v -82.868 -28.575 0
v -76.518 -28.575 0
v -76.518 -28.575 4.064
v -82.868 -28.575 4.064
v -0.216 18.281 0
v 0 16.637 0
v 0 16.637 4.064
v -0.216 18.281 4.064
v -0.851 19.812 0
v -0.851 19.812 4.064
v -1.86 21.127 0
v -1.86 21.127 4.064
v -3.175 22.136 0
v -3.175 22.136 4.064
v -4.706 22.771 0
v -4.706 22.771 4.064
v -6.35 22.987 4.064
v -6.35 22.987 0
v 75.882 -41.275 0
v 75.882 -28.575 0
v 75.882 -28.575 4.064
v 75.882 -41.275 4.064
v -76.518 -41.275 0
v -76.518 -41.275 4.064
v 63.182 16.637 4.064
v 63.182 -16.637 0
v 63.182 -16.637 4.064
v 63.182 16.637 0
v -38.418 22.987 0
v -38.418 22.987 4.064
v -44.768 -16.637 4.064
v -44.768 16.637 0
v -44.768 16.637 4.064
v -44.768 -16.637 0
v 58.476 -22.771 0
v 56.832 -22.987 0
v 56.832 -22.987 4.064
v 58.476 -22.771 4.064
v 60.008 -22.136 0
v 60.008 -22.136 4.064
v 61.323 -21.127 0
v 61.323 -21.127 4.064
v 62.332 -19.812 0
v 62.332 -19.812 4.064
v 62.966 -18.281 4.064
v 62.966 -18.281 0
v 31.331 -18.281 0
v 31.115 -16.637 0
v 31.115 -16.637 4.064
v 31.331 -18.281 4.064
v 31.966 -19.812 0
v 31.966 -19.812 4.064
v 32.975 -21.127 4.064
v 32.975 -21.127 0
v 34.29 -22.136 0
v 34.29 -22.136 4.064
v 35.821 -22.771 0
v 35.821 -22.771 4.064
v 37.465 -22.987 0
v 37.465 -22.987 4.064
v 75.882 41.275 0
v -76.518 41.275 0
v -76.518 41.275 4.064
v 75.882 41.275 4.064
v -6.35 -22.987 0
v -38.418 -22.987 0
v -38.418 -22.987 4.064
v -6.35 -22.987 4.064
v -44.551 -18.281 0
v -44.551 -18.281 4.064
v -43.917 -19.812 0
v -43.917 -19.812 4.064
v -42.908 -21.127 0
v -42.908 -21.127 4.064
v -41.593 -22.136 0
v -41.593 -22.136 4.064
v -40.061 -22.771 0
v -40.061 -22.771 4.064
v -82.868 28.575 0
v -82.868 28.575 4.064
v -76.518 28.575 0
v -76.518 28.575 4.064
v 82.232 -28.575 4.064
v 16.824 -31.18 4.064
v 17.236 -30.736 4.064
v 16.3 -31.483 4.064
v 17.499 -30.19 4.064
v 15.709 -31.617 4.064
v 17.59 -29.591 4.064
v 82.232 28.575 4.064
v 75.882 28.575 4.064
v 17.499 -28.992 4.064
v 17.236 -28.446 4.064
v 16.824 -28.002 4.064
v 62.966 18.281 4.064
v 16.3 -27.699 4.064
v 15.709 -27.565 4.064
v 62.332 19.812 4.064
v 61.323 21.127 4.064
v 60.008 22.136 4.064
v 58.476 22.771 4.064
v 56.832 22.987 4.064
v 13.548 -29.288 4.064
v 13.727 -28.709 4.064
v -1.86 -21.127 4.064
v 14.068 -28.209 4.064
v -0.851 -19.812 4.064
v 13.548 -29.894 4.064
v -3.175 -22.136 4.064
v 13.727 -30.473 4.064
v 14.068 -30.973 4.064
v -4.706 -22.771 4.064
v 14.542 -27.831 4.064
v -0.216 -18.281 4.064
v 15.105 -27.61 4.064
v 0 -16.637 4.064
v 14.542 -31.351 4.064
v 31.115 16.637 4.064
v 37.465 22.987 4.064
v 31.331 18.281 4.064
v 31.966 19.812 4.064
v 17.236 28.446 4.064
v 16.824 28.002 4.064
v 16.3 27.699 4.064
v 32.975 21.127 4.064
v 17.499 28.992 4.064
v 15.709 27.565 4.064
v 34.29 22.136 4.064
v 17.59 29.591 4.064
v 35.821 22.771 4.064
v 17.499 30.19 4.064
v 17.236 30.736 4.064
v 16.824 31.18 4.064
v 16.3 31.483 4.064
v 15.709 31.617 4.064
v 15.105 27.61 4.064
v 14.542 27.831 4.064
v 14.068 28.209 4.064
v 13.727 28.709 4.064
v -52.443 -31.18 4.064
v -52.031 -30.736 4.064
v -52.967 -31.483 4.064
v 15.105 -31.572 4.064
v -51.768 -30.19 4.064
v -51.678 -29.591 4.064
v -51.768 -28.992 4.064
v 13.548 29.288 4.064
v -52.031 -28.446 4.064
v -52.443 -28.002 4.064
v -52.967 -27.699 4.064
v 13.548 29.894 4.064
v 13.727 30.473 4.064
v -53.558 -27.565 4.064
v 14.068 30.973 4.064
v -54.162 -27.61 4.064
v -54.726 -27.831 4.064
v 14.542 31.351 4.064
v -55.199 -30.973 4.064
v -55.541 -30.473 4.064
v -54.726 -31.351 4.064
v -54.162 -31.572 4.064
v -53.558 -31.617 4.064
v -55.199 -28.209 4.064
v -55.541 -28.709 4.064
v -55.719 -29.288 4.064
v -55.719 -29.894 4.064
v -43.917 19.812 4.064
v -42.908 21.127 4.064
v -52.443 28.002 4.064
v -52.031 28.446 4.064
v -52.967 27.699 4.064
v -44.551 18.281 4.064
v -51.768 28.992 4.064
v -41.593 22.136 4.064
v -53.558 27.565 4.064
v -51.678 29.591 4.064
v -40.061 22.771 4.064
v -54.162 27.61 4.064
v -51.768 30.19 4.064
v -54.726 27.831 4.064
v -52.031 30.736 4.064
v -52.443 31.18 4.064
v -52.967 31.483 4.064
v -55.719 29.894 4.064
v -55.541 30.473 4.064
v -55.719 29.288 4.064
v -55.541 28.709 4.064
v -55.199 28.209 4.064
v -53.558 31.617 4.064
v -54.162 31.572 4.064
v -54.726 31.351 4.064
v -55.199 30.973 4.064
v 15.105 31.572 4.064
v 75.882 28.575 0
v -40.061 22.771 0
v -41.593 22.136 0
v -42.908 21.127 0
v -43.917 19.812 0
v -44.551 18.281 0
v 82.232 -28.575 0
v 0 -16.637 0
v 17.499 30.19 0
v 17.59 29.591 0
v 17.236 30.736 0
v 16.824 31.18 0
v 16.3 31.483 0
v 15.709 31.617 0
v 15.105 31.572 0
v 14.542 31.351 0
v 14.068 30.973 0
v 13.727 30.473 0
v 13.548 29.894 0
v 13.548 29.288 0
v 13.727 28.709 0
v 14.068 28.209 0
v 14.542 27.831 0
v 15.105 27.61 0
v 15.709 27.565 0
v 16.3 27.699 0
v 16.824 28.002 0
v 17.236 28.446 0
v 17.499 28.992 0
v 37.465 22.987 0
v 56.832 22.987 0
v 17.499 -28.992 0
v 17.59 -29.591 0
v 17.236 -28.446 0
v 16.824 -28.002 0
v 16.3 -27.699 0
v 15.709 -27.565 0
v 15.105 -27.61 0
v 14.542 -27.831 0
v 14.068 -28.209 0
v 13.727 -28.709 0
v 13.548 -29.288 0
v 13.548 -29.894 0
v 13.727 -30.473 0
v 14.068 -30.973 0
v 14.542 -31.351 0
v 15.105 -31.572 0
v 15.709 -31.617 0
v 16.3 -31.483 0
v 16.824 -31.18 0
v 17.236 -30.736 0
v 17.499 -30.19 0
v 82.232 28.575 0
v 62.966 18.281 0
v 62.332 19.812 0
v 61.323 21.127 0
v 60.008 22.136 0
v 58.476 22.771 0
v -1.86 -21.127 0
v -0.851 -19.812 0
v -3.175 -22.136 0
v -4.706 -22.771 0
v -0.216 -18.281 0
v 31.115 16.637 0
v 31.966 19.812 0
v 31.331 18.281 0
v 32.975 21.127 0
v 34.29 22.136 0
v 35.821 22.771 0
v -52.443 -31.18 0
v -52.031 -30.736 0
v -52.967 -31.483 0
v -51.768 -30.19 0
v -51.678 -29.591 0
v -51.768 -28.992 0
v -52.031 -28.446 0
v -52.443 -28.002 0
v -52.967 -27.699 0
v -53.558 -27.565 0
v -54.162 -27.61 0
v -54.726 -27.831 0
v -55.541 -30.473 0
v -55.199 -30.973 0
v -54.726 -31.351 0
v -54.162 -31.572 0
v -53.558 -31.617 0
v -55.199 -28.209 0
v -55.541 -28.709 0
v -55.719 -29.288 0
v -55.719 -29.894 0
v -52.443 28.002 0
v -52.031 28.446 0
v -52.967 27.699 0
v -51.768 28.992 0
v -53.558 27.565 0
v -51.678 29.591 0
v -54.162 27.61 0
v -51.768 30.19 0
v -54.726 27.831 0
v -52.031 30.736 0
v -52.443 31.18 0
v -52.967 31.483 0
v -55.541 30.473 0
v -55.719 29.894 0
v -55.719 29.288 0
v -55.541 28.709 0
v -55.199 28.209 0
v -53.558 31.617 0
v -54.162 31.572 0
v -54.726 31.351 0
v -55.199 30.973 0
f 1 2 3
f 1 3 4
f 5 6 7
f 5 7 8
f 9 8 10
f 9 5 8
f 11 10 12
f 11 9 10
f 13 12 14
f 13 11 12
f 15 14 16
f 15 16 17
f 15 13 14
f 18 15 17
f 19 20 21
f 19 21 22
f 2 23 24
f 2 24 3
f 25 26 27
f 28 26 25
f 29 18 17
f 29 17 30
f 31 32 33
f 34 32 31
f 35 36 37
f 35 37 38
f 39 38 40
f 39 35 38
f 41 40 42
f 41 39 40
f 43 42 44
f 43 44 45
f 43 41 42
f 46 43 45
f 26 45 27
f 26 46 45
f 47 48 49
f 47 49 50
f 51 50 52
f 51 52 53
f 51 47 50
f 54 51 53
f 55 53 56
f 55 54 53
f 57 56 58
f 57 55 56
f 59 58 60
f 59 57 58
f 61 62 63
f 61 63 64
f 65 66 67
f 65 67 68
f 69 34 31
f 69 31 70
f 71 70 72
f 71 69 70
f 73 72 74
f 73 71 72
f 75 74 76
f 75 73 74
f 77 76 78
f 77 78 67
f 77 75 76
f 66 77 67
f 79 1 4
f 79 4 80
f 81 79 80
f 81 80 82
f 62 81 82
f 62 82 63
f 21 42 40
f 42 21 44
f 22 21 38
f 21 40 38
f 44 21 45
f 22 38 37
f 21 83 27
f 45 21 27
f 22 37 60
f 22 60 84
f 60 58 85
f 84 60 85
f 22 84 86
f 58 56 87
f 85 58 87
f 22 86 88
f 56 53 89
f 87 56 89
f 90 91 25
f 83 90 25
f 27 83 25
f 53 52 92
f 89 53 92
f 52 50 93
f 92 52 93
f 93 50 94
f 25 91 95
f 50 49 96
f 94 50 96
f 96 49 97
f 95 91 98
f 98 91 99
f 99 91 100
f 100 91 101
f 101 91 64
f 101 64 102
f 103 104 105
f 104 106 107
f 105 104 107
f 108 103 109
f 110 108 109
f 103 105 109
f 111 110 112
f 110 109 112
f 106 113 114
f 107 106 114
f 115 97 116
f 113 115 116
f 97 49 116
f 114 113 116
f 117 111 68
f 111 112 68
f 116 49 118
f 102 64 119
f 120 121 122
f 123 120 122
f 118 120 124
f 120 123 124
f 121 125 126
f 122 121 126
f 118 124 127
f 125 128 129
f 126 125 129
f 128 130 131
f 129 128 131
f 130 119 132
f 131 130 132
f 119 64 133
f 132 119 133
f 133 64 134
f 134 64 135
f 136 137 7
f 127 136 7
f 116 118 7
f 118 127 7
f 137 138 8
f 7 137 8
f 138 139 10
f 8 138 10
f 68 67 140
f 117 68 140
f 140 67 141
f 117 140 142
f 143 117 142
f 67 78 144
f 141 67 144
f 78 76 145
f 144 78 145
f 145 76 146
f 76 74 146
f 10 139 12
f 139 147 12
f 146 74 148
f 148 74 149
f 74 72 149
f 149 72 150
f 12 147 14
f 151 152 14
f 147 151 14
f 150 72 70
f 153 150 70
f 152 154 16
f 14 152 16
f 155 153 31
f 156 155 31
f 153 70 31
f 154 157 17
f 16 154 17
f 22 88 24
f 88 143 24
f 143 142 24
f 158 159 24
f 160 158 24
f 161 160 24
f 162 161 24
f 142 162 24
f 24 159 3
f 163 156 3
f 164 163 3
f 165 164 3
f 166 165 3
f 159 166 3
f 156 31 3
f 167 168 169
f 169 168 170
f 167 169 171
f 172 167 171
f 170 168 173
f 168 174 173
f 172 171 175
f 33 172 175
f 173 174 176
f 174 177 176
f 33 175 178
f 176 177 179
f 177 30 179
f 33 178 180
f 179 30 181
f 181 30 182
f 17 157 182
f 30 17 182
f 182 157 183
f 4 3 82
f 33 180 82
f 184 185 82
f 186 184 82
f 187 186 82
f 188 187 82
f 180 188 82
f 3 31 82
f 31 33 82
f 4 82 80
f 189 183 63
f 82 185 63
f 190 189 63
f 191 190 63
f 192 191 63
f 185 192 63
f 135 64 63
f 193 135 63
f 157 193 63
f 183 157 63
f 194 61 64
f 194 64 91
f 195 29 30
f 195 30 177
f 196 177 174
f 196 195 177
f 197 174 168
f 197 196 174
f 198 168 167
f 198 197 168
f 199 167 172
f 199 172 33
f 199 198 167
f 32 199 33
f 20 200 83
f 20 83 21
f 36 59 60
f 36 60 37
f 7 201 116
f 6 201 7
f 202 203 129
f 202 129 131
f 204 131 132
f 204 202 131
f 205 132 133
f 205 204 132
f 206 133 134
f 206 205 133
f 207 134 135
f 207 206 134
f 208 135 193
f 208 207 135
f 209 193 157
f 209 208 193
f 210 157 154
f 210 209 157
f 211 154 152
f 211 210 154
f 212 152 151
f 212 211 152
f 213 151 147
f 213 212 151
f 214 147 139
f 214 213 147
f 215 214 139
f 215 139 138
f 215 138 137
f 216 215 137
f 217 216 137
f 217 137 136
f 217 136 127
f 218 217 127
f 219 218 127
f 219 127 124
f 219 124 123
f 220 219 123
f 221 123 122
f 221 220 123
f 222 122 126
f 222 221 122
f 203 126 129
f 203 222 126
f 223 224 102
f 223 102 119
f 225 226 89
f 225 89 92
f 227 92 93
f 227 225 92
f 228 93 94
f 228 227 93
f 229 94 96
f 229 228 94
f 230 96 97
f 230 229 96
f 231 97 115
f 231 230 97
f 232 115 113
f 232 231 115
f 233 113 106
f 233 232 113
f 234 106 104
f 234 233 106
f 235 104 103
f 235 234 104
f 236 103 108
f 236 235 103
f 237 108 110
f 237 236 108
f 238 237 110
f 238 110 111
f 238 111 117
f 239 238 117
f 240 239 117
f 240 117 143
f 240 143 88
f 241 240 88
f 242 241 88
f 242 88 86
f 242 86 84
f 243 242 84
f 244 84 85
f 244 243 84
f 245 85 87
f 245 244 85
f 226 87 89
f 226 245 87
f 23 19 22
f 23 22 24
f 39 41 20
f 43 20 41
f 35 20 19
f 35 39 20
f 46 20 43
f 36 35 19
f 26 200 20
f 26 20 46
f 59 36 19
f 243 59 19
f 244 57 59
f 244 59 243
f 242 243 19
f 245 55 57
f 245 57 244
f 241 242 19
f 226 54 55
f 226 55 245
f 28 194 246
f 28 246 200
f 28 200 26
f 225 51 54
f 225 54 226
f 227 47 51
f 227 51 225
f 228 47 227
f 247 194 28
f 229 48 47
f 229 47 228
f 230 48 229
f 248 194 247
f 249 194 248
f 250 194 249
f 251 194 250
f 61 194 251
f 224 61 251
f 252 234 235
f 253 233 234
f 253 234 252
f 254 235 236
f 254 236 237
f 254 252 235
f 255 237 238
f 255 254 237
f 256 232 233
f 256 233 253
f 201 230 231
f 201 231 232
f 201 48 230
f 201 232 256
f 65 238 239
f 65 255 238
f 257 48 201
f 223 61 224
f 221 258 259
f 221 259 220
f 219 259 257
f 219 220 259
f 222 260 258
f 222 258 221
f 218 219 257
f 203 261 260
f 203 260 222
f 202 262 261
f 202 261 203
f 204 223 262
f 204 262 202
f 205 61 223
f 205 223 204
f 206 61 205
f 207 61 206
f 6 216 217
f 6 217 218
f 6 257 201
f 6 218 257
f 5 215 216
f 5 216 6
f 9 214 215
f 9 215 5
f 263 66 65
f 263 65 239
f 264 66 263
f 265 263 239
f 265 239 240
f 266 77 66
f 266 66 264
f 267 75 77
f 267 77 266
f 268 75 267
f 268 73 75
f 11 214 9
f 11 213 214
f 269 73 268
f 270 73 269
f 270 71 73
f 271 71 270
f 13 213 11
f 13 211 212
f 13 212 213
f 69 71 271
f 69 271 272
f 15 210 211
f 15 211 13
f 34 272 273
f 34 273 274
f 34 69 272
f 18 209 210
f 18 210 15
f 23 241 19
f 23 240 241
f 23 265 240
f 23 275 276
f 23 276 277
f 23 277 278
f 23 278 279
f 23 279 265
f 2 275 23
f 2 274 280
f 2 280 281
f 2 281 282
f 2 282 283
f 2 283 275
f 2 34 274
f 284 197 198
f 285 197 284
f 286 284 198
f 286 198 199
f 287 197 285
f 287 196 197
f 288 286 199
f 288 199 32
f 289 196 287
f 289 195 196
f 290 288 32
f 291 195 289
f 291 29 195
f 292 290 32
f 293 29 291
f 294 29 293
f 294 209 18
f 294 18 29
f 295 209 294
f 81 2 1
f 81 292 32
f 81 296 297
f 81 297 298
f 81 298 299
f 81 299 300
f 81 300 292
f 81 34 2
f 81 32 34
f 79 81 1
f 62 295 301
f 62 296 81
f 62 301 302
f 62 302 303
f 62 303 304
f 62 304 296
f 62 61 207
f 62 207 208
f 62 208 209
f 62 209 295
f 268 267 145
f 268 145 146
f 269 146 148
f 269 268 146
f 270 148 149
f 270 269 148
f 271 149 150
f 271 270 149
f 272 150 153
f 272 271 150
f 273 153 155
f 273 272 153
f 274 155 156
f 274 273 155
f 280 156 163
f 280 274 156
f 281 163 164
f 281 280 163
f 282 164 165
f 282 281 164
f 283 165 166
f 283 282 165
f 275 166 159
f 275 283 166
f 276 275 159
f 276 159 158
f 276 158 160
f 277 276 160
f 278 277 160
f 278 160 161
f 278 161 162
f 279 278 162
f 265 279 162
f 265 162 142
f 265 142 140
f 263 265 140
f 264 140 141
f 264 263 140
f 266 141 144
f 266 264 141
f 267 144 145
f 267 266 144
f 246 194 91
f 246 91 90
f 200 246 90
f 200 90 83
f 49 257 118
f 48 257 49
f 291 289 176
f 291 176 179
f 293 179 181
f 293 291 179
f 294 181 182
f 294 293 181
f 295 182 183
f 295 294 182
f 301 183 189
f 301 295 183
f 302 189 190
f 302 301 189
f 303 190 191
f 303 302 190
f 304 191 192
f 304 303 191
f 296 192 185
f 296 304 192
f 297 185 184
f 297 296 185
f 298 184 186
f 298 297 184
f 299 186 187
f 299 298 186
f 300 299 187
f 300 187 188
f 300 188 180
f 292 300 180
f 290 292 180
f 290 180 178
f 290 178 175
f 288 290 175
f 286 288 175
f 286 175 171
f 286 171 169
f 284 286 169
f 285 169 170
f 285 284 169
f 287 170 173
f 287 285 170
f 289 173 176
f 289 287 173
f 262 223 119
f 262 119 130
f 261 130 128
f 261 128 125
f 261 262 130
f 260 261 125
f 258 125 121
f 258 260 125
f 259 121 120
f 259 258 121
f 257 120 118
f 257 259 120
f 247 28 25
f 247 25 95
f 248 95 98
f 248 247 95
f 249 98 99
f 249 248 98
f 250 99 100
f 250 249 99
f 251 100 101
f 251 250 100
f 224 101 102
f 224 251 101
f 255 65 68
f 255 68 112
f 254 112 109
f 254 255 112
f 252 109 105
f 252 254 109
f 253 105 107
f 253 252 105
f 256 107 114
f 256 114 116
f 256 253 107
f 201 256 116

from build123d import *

# Parameters (mm, degrees)
SKETCH1_R           = 2.032
BOSS_EXTRUDE1_DEPTH = 4.064


with BuildPart() as part:
    # Sketch1 → Boss-Extrude1 (new body)
    with BuildSketch(Plane.XY):
        Polygon((75.8825, -41.275), (-76.5175, -41.275), (-76.5175, -28.575), (-82.8675, -28.575), (-82.8675, 28.575), (-76.5175, 28.575), (-76.5175, 41.275), (75.8825, 41.275), (75.8825, 28.575), (82.2325, 28.575), (82.2325, -28.575), (75.8825, -28.575), align=None)
        with Locations((-53.709797321, 29.591)):
            Circle(SKETCH1_R, mode=Mode.SUBTRACT)
        with Locations((15.5575, 29.591)):
            Circle(SKETCH1_R, mode=Mode.SUBTRACT)
        with Locations((-53.709797321, -29.591)):
            Circle(SKETCH1_R, mode=Mode.SUBTRACT)
        with Locations((15.5575, -29.591)):
            Circle(SKETCH1_R, mode=Mode.SUBTRACT)
        with BuildLine():
            Line((56.8325, 22.987), (37.465, 22.987))
            ThreePointArc((37.465, 22.987), (32.974871939, 21.127128061), (31.115, 16.637))
            Line((31.115, 16.637), (31.115, -16.637))
            ThreePointArc((31.115, -16.637), (32.974871939, -21.127128061), (37.465, -22.987))
            Line((37.465, -22.987), (56.8325, -22.987))
            ThreePointArc((56.8325, -22.987), (61.322628061, -21.127128061), (63.1825, -16.637))
            Line((63.1825, -16.637), (63.1825, 16.637))
            ThreePointArc((63.1825, 16.637), (61.322628061, 21.127128061), (56.8325, 22.987))
        make_face(mode=Mode.SUBTRACT)
        with BuildLine():
            Line((-6.35, 22.987), (-38.4175, 22.987))
            ThreePointArc((-38.4175, 22.987), (-42.907628061, 21.127128061), (-44.7675, 16.637))
            Line((-44.7675, 16.637), (-44.7675, -16.637))
            ThreePointArc((-44.7675, -16.637), (-42.907628061, -21.127128061), (-38.4175, -22.987))
            Line((-38.4175, -22.987), (-6.35, -22.987))
            ThreePointArc((-6.35, -22.987), (-1.859871939, -21.127128061), (0, -16.637))
            Line((0, -16.637), (0, 16.637))
            ThreePointArc((0, 16.637), (-1.859871939, 21.127128061), (-6.35, 22.987))
        make_face(mode=Mode.SUBTRACT)
    extrude(amount=BOSS_EXTRUDE1_DEPTH)


solid = part.part
